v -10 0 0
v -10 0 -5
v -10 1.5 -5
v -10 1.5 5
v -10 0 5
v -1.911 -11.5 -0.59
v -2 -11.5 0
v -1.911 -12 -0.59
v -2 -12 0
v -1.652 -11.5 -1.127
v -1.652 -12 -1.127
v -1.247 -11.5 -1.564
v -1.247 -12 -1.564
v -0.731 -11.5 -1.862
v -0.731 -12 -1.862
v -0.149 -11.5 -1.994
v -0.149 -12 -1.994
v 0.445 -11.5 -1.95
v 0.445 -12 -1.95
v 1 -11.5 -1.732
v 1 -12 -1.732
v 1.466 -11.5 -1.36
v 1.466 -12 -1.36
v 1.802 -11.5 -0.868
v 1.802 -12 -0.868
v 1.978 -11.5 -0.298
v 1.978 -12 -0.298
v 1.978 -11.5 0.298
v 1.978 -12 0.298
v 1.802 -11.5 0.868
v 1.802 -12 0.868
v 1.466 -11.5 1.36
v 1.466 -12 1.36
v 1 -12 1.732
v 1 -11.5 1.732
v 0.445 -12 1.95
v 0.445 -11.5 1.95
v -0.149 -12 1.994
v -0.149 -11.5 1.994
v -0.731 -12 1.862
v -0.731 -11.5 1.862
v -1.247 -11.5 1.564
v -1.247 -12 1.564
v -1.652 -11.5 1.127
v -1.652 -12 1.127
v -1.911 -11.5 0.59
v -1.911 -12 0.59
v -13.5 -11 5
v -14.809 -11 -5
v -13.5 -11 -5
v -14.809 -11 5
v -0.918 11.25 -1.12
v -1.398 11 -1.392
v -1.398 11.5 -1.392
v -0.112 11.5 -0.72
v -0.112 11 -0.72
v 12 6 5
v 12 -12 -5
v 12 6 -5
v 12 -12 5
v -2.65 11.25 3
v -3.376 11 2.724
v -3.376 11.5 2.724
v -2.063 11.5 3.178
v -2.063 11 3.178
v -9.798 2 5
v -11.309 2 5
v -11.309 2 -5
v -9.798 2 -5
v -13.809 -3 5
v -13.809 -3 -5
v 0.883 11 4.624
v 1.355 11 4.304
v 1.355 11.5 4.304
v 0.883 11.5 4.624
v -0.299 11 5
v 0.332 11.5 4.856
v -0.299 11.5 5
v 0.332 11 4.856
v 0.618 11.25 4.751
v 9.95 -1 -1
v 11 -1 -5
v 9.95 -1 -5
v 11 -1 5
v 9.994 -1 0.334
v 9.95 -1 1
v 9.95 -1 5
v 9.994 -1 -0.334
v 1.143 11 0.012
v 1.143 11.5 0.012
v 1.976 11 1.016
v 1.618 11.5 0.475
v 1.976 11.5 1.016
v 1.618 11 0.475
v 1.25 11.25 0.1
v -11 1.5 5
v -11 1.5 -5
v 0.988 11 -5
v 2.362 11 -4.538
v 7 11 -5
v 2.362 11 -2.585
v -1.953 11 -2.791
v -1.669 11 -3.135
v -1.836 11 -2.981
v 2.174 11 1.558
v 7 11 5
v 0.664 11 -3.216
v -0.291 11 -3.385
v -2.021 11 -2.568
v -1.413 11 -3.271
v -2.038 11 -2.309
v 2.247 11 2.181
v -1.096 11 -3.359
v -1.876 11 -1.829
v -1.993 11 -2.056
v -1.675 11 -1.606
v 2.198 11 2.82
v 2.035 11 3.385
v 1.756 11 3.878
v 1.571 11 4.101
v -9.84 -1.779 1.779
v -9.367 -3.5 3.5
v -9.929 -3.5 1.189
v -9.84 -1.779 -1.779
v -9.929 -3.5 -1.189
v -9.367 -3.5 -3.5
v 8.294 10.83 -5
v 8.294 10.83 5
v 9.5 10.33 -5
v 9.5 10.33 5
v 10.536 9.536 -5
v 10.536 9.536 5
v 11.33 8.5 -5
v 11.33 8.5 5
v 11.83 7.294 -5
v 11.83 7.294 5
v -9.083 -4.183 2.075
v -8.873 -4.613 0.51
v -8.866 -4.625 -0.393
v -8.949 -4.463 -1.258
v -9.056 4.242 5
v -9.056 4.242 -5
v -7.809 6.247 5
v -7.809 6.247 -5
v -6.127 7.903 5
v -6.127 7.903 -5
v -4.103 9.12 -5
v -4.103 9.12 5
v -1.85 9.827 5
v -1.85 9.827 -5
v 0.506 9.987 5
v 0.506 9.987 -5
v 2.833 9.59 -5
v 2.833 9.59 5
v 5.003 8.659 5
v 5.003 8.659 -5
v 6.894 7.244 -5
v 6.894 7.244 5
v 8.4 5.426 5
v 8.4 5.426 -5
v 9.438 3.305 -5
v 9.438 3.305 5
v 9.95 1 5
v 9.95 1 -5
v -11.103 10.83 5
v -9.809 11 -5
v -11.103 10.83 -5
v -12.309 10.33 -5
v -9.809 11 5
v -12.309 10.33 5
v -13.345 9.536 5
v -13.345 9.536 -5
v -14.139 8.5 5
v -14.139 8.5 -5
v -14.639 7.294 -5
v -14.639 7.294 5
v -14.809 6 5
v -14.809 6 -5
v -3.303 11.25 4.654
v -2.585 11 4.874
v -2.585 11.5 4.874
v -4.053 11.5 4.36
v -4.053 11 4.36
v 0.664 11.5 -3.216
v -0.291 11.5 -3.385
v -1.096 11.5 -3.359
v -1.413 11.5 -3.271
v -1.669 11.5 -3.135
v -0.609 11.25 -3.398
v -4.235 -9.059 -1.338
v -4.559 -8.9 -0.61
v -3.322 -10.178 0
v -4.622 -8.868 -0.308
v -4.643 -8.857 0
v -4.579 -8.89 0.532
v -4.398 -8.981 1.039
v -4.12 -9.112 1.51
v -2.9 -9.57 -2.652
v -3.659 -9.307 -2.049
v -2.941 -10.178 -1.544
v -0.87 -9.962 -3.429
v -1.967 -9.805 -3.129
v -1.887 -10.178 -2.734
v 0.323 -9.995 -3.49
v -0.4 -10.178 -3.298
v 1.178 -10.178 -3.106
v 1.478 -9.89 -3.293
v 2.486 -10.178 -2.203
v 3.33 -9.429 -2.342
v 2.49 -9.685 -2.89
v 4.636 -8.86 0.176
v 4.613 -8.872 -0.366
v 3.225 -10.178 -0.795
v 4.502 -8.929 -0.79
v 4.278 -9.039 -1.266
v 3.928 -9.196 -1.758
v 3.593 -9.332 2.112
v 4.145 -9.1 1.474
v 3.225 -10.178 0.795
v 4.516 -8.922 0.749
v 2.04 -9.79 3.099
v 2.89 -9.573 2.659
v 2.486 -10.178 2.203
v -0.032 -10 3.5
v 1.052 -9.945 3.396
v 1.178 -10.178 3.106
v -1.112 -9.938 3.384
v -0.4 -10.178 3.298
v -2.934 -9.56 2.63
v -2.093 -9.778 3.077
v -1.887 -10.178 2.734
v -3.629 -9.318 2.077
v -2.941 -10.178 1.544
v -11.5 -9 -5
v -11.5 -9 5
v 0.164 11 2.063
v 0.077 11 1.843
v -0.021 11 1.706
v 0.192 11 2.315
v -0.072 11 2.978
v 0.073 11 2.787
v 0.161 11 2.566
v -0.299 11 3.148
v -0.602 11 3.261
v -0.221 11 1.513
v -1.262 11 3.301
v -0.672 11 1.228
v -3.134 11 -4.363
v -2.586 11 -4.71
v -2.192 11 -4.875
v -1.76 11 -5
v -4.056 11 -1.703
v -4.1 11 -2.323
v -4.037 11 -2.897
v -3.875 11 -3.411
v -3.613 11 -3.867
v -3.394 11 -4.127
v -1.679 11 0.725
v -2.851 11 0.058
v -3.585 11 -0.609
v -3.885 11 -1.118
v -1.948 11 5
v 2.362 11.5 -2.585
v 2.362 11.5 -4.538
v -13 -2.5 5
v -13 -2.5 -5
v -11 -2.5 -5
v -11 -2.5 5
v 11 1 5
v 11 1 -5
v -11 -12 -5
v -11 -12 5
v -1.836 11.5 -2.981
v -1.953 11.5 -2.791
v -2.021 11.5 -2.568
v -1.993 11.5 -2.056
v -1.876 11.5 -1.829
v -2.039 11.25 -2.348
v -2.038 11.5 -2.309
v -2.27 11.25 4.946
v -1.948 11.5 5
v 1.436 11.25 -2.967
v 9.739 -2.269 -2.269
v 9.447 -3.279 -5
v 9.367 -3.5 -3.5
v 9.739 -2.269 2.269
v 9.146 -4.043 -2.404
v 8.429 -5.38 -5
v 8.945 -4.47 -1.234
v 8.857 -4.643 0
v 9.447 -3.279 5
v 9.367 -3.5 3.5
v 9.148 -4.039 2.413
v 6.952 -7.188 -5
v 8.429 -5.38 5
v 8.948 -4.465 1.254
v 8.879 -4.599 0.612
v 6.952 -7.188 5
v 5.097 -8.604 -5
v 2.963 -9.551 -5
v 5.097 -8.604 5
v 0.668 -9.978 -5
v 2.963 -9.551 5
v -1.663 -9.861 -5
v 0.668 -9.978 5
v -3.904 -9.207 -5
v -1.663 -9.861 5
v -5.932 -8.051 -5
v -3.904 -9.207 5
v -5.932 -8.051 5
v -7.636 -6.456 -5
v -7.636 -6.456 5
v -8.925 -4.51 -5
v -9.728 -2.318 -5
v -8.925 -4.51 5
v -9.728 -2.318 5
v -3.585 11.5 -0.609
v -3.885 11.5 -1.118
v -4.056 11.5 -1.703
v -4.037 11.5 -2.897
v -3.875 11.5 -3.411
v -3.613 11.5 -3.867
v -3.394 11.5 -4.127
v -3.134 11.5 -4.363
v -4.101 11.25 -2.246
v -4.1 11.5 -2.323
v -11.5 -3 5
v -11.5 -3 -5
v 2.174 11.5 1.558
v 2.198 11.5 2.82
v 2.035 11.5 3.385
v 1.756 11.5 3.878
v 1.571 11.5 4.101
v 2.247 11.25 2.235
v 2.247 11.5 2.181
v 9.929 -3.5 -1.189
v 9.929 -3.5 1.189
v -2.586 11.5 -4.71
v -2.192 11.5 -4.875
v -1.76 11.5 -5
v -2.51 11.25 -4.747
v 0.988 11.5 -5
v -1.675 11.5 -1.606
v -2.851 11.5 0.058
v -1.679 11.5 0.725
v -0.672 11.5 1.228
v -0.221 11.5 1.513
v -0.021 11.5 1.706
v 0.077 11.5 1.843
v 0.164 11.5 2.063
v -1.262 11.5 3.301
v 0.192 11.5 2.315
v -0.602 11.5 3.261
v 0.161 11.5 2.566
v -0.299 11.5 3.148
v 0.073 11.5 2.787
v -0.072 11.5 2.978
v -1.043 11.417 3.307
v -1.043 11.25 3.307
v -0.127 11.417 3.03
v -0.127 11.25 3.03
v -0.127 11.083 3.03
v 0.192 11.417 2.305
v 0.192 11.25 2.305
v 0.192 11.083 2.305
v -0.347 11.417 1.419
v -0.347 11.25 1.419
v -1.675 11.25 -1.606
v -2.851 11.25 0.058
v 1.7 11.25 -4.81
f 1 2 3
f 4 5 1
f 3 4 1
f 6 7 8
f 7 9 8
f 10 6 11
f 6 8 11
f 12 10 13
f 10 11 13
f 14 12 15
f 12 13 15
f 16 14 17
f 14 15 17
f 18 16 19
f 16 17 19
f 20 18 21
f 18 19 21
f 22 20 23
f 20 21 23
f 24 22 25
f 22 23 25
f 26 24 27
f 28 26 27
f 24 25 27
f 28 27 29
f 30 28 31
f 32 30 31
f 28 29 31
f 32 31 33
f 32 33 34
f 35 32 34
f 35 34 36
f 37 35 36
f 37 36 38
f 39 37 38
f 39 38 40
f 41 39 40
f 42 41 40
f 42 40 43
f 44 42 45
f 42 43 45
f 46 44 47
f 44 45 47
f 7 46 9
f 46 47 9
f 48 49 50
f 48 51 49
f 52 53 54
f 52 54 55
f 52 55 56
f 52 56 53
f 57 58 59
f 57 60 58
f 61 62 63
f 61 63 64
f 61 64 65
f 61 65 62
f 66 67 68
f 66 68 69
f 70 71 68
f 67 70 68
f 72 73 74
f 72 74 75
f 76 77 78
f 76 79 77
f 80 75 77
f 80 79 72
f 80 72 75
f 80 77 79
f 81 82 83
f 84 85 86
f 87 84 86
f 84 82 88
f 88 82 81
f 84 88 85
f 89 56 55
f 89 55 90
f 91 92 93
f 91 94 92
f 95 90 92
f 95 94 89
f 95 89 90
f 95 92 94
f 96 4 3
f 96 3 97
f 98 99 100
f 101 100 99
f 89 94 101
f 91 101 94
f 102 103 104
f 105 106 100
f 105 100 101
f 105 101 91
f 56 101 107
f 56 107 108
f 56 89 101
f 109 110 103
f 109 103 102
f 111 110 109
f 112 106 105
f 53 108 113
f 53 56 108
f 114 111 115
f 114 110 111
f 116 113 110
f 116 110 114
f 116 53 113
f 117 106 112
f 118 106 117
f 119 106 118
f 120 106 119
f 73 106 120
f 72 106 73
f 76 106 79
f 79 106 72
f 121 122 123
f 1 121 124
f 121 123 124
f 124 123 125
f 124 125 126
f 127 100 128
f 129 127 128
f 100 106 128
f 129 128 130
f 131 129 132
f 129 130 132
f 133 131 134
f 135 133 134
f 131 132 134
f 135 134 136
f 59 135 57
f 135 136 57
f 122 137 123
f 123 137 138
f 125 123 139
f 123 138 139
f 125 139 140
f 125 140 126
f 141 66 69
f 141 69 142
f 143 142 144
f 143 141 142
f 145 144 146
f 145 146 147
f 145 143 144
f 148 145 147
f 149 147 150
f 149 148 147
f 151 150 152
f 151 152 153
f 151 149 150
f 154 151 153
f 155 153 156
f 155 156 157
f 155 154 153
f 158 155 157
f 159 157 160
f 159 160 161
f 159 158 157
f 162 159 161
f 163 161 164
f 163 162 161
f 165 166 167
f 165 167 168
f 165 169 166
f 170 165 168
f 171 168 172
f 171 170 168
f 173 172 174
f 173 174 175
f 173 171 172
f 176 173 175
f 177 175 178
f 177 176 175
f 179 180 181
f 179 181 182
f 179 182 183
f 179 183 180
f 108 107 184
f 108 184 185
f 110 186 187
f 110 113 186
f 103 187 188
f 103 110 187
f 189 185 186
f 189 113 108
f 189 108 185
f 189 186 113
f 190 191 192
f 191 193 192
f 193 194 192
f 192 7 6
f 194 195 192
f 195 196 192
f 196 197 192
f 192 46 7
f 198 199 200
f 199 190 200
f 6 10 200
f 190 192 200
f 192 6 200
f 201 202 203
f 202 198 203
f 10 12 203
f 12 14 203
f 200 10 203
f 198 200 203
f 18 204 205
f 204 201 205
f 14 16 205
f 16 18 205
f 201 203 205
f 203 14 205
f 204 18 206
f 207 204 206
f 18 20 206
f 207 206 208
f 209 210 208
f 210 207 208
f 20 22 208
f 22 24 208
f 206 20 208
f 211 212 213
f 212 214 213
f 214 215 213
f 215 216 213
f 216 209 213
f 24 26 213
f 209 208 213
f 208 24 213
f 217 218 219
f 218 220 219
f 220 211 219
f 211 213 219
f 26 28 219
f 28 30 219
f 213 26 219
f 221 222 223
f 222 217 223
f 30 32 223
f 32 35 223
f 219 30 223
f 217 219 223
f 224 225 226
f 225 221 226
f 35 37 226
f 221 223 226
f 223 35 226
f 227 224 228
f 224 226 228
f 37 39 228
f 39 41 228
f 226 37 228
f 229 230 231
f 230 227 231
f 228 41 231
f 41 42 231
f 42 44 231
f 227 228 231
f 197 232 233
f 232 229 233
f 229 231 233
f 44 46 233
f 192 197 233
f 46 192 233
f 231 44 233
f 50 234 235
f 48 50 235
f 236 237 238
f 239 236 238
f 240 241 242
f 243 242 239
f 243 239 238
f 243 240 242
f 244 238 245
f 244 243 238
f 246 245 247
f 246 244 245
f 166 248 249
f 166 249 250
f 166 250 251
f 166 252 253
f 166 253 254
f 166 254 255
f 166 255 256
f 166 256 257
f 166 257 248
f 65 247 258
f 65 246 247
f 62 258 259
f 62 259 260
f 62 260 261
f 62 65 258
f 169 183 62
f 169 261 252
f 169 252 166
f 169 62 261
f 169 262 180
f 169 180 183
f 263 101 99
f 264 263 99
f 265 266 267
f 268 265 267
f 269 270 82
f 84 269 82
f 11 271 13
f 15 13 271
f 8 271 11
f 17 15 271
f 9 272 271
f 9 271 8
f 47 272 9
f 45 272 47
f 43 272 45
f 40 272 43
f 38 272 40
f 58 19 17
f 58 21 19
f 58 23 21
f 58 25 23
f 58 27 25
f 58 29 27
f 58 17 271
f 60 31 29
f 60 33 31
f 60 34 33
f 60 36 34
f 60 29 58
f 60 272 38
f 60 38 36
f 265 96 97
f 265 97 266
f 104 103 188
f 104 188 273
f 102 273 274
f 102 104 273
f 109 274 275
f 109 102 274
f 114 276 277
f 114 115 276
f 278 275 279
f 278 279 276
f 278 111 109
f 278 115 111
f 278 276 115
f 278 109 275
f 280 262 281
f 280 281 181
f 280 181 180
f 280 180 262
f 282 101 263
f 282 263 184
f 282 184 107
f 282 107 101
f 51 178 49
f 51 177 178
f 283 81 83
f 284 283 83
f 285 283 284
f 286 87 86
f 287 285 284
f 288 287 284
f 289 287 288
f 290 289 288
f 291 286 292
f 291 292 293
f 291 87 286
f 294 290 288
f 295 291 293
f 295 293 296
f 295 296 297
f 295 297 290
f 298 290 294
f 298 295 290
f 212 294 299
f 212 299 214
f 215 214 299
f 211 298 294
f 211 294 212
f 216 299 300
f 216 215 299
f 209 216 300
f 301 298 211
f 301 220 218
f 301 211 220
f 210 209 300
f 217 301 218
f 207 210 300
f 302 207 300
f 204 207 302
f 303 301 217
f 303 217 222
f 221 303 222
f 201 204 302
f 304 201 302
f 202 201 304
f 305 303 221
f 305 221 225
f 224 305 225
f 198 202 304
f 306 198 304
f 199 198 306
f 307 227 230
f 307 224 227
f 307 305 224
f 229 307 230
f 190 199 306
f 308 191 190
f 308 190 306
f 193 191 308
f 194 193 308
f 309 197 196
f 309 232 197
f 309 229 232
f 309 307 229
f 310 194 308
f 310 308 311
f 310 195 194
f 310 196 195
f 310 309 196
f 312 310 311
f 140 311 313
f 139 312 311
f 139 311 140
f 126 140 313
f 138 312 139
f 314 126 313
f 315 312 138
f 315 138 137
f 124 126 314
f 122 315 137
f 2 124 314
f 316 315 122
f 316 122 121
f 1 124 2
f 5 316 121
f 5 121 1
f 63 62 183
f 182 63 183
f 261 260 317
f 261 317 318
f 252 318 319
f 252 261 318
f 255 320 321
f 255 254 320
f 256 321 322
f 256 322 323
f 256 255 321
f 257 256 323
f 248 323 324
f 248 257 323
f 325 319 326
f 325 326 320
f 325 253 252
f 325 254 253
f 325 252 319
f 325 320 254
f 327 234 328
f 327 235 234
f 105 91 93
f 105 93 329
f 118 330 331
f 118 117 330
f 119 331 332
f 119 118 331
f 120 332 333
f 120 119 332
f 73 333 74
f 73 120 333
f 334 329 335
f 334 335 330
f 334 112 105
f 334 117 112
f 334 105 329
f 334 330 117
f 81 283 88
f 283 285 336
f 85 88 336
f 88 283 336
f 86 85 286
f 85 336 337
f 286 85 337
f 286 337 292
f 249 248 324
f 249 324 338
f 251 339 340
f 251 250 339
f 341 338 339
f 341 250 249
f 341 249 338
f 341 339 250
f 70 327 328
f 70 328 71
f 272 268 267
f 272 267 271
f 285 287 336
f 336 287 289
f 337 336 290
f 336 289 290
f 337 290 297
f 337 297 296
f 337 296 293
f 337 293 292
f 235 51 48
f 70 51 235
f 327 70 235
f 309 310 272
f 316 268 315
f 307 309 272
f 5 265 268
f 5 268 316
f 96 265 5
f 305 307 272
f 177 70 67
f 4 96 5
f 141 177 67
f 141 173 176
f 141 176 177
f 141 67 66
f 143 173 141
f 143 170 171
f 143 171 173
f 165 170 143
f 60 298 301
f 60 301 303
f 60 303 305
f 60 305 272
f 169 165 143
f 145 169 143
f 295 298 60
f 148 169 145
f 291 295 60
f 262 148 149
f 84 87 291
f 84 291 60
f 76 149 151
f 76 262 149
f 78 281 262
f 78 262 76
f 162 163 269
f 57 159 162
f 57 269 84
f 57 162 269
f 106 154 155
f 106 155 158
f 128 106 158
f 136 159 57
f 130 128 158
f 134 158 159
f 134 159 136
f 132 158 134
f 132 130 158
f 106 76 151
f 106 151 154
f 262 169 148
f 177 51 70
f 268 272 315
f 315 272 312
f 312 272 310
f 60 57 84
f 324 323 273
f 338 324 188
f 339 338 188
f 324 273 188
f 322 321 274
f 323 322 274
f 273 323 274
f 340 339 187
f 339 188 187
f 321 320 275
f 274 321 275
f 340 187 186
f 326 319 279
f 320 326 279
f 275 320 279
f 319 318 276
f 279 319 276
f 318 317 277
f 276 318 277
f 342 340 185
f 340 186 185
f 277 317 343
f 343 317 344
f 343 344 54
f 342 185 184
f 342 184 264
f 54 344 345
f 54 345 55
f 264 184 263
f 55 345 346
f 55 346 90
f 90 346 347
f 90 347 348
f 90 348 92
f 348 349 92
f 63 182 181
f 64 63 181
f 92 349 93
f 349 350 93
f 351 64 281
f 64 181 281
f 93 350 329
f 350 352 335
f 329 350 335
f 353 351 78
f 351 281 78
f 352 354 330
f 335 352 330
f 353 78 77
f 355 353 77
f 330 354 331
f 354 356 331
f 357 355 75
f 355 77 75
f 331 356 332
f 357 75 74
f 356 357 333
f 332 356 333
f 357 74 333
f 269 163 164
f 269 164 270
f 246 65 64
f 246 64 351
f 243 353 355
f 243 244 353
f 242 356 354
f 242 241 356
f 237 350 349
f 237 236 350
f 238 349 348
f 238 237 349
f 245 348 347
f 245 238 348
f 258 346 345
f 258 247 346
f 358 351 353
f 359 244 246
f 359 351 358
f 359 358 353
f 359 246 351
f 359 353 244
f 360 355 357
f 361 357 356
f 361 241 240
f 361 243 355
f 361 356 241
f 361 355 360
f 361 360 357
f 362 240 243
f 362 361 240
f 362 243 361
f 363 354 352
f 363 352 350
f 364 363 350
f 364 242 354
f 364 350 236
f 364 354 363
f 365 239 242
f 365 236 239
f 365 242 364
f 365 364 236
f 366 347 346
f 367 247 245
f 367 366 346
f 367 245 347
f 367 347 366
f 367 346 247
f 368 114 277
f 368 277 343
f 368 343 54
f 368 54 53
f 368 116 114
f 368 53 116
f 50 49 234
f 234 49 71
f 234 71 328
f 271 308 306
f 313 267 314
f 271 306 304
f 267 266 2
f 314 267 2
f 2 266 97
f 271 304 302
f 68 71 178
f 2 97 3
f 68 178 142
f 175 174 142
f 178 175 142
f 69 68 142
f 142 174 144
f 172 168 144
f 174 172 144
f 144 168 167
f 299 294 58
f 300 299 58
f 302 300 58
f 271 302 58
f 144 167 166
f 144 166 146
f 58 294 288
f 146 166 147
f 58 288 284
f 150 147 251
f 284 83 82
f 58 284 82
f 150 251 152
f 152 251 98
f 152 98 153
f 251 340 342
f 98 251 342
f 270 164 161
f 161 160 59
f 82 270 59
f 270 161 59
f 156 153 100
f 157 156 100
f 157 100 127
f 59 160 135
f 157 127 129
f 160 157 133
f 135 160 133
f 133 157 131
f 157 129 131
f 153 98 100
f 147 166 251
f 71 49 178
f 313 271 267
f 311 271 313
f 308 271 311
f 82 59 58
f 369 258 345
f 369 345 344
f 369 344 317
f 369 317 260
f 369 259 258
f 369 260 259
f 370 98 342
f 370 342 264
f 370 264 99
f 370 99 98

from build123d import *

# Parameters (mm, degrees)
F1_DEPTH = 5
F4_SIZE  = 2
F5_R     = 5
F6_R     = 5
F8_DEPTH = 0.5


with BuildPart() as f1:
    # F0 (on Top) → F1 (new body, symmetric)
    with BuildSketch(Plane.XY):
        with BuildLine():
            ThreePointArc((9.9498743711, -1), (-0.5006277506, -9.9874607311), (-10, 0))
            Line((-10, 0), (-10, 1.5))
            Line((-10, 1.5), (-11, 1.5))
            Line((-11, 1.5), (-13, -2.5))
            Line((-13, -2.5), (-11, -2.5))
            Line((-11, -2.5), (-11, -12))
            Line((-11, -12), (12, -12))
            Line((12, -12), (12, 11))
            Line((12, 11), (-14.8090169944, 11))
            Line((-14.8090169944, 11), (-14.8090169944, -11))
            Line((-14.8090169944, -11), (-11.5, -11))
            Line((-11.5, -11), (-11.5, -3))
            Line((-11.5, -3), (-13.8090169944, -3))
            Line((-13.8090169944, -3), (-11.3090169944, 2))
            Line((-11.3090169944, 2), (-9.7979589711, 2))
            ThreePointArc((-9.7979589711, 2), (0.5057366629, 9.9872033337), (9.9498743711, 1))
            Line((9.9498743711, 1), (11, 1))
            Line((11, 1), (11, -1))
            Line((11, -1), (9.9498743711, -1))
        make_face()
    extrude(amount=F1_DEPTH, both=True)

    # F2 (on Top) → F3 (revolve, cut)
    with BuildSketch(Plane.XY):
        Polygon((0, 0), (-10, 0), (-10, -3.5), (-2, -11.5), (-2, -12), (0, -12), align=None)
    revolve(axis=Axis((0, -5.25, 0), (0, -1, 0)), mode=Mode.SUBTRACT)

    # F4
    f4_edges = [f1.edges().sort_by_distance(p)[0] for p in [
        (-11.5, -11, 0),
    ]]
    chamfer(f4_edges, length=F4_SIZE)

    # F5
    f5_edges = [f1.edges().sort_by_distance(p)[0] for p in [
        (12, 11, 0),
    ]]
    fillet(f5_edges, radius=F5_R)

    # F6
    f6_edges = [f1.edges().sort_by_distance(p)[0] for p in [
        (-14.809017, 11, 0),
    ]]
    fillet(f6_edges, radius=F6_R)

    # F7 (on face) → F8 (join)
    with BuildSketch(Plane(origin=(0, 11, 0), x_dir=(-1, 0, 0), z_dir=(0, 1, 0))):
        with BuildLine():
            add(Edge.make_bspline(
                [(4.1006944444, -2.24609375), (4.1006944444, -3.5894097222), (3.1338975694, -4.3630642361)],
                knots=[0, 0, 0, 1, 1, 1], degree=2))
            add(Edge.make_bspline(
                [(3.5852864583, -0.6087239583), (4.1006944444, -1.2760416667), (4.1006944444, -2.24609375)],
                knots=[0, 0, 0, 1, 1, 1], degree=2))
            add(Edge.make_bspline(
                [(1.6788194444, 0.7248263889), (3.0698784722, 0.05859375), (3.5852864583, -0.6087239583)],
                knots=[0, 0, 0, 1, 1, 1], degree=2))
            add(Edge.make_bspline(
                [(0.3474392361, 1.4192708333), (0.6284722222, 1.2261284722), (1.6788194444, 0.7248263889)],
                knots=[0, 0, 0, 1, 1, 1], degree=2))
            add(Edge.make_bspline(
                [(-0.0627170139, 1.8196614583), (0.06640625, 1.6124131944), (0.3474392361, 1.4192708333)],
                knots=[0, 0, 0, 1, 1, 1], degree=2))
            add(Edge.make_bspline(
                [(-0.1918402778, 2.3046875), (-0.1918402778, 2.0269097222), (-0.0627170139, 1.8196614583)],
                knots=[0, 0, 0, 1, 1, 1], degree=2))
            add(Edge.make_bspline(
                [(0.1271701389, 3.0295138889), (-0.1918402778, 2.7517361111), (-0.1918402778, 2.3046875)],
                knots=[0, 0, 0, 1, 1, 1], degree=2))
            add(Edge.make_bspline(
                [(1.04296875, 3.3072916667), (0.4461805556, 3.3072916667), (0.1271701389, 3.0295138889)],
                knots=[0, 0, 0, 1, 1, 1], degree=2))
            add(Edge.make_bspline(
                [(2.0629340278, 3.1781684028), (1.5442708333, 3.3072916667), (1.04296875, 3.3072916667)],
                knots=[0, 0, 0, 1, 1, 1], degree=2))
            add(Edge.make_bspline(
                [(3.3758680556, 2.7235243056), (2.5815972222, 3.0490451389), (2.0629340278, 3.1781684028)],
                knots=[0, 0, 0, 1, 1, 1], degree=2))
            Line((3.3758680556, 2.7235243056), (4.0529513889, 4.3598090278))
            add(Edge.make_bspline(
                [(2.5848524306, 4.8741319444), (3.2868923611, 4.6918402778), (4.0529513889, 4.3598090278)],
                knots=[0, 0, 0, 1, 1, 1], degree=2))
            add(Edge.make_bspline(
                [(1.9480484116, 5), (2.2733914608, 4.9550058902), (2.5848524306, 4.8741319444)],
                knots=[0.5563486403, 0.5563486403, 0.5563486403, 1, 1, 1], degree=2))
            Line((1.9480484116, 5), (0.2994075141, 5))
            add(Edge.make_bspline(
                [(-1.3550347222, 4.3044704861), (-0.707430669, 4.8504432463), (0.2994075141, 5)],
                knots=[0, 0, 0, 0.7260728655, 0.7260728655, 0.7260728655], degree=2))
            add(Edge.make_bspline(
                [(-2.2469618056, 2.2352430556), (-2.2469618056, 3.5525173611), (-1.3550347222, 4.3044704861)],
                knots=[0, 0, 0, 1, 1, 1], degree=2))
            add(Edge.make_bspline(
                [(-1.9756944444, 1.015625), (-2.2469618056, 1.5386284722), (-2.2469618056, 2.2352430556)],
                knots=[0, 0, 0, 1, 1, 1], degree=2))
            add(Edge.make_bspline(
                [(-1.2497829861, 0.0998263889), (-1.7044270833, 0.4926215278), (-1.9756944444, 1.015625)],
                knots=[0, 0, 0, 1, 1, 1], degree=2))
            add(Edge.make_bspline(
                [(0.1119791667, -0.7204861111), (-0.7951388889, -0.29296875), (-1.2497829861, 0.0998263889)],
                knots=[0, 0, 0, 1, 1, 1], degree=2))
            add(Edge.make_bspline(
                [(1.3977864583, -1.3921440972), (1.08203125, -1.1827256944), (0.1119791667, -0.7204861111)],
                knots=[0, 0, 0, 1, 1, 1], degree=2))
            add(Edge.make_bspline(
                [(1.8763020833, -1.8294270833), (1.7135416667, -1.6015625), (1.3977864583, -1.3921440972)],
                knots=[0, 0, 0, 1, 1, 1], degree=2))
            add(Edge.make_bspline(
                [(2.0390625, -2.3480902778), (2.0390625, -2.0572916667), (1.8763020833, -1.8294270833)],
                knots=[0, 0, 0, 1, 1, 1], degree=2))
            add(Edge.make_bspline(
                [(1.6690538194, -3.134765625), (2.0390625, -2.87109375), (2.0390625, -2.3480902778)],
                knots=[0, 0, 0, 1, 1, 1], degree=2))
            add(Edge.make_bspline(
                [(0.6089409722, -3.3984375), (1.2990451389, -3.3984375), (1.6690538194, -3.134765625)],
                knots=[0, 0, 0, 1, 1, 1], degree=2))
            add(Edge.make_bspline(
                [(-0.6638454861, -3.2161458333), (0.0316840278, -3.3984375), (0.6089409722, -3.3984375)],
                knots=[0, 0, 0, 1, 1, 1], degree=2))
            add(Edge.make_bspline(
                [(-2.3619791667, -2.5846354167), (-1.359375, -3.0338541667), (-0.6638454861, -3.2161458333)],
                knots=[0, 0, 0, 1, 1, 1], degree=2))
            Line((-2.3619791667, -2.5846354167), (-2.3619791667, -4.5377604167))
            add(Edge.make_bspline(
                [(-0.987512741, -5), (-1.7250538132, -4.8505564977), (-2.3619791667, -4.5377604167)],
                knots=[0.477766543, 0.477766543, 0.477766543, 1, 1, 1], degree=2))
            Line((-0.987512741, -5), (1.7597890221, -5))
            add(Edge.make_bspline(
                [(3.1338975694, -4.3630642361), (2.5735213253, -4.8114910174), (1.7597890221, -5)],
                knots=[0, 0, 0, 0.5796214889, 0.5796214889, 0.5796214889], degree=2))
        make_face()
    extrude(amount=F8_DEPTH)


solid = f1.part
